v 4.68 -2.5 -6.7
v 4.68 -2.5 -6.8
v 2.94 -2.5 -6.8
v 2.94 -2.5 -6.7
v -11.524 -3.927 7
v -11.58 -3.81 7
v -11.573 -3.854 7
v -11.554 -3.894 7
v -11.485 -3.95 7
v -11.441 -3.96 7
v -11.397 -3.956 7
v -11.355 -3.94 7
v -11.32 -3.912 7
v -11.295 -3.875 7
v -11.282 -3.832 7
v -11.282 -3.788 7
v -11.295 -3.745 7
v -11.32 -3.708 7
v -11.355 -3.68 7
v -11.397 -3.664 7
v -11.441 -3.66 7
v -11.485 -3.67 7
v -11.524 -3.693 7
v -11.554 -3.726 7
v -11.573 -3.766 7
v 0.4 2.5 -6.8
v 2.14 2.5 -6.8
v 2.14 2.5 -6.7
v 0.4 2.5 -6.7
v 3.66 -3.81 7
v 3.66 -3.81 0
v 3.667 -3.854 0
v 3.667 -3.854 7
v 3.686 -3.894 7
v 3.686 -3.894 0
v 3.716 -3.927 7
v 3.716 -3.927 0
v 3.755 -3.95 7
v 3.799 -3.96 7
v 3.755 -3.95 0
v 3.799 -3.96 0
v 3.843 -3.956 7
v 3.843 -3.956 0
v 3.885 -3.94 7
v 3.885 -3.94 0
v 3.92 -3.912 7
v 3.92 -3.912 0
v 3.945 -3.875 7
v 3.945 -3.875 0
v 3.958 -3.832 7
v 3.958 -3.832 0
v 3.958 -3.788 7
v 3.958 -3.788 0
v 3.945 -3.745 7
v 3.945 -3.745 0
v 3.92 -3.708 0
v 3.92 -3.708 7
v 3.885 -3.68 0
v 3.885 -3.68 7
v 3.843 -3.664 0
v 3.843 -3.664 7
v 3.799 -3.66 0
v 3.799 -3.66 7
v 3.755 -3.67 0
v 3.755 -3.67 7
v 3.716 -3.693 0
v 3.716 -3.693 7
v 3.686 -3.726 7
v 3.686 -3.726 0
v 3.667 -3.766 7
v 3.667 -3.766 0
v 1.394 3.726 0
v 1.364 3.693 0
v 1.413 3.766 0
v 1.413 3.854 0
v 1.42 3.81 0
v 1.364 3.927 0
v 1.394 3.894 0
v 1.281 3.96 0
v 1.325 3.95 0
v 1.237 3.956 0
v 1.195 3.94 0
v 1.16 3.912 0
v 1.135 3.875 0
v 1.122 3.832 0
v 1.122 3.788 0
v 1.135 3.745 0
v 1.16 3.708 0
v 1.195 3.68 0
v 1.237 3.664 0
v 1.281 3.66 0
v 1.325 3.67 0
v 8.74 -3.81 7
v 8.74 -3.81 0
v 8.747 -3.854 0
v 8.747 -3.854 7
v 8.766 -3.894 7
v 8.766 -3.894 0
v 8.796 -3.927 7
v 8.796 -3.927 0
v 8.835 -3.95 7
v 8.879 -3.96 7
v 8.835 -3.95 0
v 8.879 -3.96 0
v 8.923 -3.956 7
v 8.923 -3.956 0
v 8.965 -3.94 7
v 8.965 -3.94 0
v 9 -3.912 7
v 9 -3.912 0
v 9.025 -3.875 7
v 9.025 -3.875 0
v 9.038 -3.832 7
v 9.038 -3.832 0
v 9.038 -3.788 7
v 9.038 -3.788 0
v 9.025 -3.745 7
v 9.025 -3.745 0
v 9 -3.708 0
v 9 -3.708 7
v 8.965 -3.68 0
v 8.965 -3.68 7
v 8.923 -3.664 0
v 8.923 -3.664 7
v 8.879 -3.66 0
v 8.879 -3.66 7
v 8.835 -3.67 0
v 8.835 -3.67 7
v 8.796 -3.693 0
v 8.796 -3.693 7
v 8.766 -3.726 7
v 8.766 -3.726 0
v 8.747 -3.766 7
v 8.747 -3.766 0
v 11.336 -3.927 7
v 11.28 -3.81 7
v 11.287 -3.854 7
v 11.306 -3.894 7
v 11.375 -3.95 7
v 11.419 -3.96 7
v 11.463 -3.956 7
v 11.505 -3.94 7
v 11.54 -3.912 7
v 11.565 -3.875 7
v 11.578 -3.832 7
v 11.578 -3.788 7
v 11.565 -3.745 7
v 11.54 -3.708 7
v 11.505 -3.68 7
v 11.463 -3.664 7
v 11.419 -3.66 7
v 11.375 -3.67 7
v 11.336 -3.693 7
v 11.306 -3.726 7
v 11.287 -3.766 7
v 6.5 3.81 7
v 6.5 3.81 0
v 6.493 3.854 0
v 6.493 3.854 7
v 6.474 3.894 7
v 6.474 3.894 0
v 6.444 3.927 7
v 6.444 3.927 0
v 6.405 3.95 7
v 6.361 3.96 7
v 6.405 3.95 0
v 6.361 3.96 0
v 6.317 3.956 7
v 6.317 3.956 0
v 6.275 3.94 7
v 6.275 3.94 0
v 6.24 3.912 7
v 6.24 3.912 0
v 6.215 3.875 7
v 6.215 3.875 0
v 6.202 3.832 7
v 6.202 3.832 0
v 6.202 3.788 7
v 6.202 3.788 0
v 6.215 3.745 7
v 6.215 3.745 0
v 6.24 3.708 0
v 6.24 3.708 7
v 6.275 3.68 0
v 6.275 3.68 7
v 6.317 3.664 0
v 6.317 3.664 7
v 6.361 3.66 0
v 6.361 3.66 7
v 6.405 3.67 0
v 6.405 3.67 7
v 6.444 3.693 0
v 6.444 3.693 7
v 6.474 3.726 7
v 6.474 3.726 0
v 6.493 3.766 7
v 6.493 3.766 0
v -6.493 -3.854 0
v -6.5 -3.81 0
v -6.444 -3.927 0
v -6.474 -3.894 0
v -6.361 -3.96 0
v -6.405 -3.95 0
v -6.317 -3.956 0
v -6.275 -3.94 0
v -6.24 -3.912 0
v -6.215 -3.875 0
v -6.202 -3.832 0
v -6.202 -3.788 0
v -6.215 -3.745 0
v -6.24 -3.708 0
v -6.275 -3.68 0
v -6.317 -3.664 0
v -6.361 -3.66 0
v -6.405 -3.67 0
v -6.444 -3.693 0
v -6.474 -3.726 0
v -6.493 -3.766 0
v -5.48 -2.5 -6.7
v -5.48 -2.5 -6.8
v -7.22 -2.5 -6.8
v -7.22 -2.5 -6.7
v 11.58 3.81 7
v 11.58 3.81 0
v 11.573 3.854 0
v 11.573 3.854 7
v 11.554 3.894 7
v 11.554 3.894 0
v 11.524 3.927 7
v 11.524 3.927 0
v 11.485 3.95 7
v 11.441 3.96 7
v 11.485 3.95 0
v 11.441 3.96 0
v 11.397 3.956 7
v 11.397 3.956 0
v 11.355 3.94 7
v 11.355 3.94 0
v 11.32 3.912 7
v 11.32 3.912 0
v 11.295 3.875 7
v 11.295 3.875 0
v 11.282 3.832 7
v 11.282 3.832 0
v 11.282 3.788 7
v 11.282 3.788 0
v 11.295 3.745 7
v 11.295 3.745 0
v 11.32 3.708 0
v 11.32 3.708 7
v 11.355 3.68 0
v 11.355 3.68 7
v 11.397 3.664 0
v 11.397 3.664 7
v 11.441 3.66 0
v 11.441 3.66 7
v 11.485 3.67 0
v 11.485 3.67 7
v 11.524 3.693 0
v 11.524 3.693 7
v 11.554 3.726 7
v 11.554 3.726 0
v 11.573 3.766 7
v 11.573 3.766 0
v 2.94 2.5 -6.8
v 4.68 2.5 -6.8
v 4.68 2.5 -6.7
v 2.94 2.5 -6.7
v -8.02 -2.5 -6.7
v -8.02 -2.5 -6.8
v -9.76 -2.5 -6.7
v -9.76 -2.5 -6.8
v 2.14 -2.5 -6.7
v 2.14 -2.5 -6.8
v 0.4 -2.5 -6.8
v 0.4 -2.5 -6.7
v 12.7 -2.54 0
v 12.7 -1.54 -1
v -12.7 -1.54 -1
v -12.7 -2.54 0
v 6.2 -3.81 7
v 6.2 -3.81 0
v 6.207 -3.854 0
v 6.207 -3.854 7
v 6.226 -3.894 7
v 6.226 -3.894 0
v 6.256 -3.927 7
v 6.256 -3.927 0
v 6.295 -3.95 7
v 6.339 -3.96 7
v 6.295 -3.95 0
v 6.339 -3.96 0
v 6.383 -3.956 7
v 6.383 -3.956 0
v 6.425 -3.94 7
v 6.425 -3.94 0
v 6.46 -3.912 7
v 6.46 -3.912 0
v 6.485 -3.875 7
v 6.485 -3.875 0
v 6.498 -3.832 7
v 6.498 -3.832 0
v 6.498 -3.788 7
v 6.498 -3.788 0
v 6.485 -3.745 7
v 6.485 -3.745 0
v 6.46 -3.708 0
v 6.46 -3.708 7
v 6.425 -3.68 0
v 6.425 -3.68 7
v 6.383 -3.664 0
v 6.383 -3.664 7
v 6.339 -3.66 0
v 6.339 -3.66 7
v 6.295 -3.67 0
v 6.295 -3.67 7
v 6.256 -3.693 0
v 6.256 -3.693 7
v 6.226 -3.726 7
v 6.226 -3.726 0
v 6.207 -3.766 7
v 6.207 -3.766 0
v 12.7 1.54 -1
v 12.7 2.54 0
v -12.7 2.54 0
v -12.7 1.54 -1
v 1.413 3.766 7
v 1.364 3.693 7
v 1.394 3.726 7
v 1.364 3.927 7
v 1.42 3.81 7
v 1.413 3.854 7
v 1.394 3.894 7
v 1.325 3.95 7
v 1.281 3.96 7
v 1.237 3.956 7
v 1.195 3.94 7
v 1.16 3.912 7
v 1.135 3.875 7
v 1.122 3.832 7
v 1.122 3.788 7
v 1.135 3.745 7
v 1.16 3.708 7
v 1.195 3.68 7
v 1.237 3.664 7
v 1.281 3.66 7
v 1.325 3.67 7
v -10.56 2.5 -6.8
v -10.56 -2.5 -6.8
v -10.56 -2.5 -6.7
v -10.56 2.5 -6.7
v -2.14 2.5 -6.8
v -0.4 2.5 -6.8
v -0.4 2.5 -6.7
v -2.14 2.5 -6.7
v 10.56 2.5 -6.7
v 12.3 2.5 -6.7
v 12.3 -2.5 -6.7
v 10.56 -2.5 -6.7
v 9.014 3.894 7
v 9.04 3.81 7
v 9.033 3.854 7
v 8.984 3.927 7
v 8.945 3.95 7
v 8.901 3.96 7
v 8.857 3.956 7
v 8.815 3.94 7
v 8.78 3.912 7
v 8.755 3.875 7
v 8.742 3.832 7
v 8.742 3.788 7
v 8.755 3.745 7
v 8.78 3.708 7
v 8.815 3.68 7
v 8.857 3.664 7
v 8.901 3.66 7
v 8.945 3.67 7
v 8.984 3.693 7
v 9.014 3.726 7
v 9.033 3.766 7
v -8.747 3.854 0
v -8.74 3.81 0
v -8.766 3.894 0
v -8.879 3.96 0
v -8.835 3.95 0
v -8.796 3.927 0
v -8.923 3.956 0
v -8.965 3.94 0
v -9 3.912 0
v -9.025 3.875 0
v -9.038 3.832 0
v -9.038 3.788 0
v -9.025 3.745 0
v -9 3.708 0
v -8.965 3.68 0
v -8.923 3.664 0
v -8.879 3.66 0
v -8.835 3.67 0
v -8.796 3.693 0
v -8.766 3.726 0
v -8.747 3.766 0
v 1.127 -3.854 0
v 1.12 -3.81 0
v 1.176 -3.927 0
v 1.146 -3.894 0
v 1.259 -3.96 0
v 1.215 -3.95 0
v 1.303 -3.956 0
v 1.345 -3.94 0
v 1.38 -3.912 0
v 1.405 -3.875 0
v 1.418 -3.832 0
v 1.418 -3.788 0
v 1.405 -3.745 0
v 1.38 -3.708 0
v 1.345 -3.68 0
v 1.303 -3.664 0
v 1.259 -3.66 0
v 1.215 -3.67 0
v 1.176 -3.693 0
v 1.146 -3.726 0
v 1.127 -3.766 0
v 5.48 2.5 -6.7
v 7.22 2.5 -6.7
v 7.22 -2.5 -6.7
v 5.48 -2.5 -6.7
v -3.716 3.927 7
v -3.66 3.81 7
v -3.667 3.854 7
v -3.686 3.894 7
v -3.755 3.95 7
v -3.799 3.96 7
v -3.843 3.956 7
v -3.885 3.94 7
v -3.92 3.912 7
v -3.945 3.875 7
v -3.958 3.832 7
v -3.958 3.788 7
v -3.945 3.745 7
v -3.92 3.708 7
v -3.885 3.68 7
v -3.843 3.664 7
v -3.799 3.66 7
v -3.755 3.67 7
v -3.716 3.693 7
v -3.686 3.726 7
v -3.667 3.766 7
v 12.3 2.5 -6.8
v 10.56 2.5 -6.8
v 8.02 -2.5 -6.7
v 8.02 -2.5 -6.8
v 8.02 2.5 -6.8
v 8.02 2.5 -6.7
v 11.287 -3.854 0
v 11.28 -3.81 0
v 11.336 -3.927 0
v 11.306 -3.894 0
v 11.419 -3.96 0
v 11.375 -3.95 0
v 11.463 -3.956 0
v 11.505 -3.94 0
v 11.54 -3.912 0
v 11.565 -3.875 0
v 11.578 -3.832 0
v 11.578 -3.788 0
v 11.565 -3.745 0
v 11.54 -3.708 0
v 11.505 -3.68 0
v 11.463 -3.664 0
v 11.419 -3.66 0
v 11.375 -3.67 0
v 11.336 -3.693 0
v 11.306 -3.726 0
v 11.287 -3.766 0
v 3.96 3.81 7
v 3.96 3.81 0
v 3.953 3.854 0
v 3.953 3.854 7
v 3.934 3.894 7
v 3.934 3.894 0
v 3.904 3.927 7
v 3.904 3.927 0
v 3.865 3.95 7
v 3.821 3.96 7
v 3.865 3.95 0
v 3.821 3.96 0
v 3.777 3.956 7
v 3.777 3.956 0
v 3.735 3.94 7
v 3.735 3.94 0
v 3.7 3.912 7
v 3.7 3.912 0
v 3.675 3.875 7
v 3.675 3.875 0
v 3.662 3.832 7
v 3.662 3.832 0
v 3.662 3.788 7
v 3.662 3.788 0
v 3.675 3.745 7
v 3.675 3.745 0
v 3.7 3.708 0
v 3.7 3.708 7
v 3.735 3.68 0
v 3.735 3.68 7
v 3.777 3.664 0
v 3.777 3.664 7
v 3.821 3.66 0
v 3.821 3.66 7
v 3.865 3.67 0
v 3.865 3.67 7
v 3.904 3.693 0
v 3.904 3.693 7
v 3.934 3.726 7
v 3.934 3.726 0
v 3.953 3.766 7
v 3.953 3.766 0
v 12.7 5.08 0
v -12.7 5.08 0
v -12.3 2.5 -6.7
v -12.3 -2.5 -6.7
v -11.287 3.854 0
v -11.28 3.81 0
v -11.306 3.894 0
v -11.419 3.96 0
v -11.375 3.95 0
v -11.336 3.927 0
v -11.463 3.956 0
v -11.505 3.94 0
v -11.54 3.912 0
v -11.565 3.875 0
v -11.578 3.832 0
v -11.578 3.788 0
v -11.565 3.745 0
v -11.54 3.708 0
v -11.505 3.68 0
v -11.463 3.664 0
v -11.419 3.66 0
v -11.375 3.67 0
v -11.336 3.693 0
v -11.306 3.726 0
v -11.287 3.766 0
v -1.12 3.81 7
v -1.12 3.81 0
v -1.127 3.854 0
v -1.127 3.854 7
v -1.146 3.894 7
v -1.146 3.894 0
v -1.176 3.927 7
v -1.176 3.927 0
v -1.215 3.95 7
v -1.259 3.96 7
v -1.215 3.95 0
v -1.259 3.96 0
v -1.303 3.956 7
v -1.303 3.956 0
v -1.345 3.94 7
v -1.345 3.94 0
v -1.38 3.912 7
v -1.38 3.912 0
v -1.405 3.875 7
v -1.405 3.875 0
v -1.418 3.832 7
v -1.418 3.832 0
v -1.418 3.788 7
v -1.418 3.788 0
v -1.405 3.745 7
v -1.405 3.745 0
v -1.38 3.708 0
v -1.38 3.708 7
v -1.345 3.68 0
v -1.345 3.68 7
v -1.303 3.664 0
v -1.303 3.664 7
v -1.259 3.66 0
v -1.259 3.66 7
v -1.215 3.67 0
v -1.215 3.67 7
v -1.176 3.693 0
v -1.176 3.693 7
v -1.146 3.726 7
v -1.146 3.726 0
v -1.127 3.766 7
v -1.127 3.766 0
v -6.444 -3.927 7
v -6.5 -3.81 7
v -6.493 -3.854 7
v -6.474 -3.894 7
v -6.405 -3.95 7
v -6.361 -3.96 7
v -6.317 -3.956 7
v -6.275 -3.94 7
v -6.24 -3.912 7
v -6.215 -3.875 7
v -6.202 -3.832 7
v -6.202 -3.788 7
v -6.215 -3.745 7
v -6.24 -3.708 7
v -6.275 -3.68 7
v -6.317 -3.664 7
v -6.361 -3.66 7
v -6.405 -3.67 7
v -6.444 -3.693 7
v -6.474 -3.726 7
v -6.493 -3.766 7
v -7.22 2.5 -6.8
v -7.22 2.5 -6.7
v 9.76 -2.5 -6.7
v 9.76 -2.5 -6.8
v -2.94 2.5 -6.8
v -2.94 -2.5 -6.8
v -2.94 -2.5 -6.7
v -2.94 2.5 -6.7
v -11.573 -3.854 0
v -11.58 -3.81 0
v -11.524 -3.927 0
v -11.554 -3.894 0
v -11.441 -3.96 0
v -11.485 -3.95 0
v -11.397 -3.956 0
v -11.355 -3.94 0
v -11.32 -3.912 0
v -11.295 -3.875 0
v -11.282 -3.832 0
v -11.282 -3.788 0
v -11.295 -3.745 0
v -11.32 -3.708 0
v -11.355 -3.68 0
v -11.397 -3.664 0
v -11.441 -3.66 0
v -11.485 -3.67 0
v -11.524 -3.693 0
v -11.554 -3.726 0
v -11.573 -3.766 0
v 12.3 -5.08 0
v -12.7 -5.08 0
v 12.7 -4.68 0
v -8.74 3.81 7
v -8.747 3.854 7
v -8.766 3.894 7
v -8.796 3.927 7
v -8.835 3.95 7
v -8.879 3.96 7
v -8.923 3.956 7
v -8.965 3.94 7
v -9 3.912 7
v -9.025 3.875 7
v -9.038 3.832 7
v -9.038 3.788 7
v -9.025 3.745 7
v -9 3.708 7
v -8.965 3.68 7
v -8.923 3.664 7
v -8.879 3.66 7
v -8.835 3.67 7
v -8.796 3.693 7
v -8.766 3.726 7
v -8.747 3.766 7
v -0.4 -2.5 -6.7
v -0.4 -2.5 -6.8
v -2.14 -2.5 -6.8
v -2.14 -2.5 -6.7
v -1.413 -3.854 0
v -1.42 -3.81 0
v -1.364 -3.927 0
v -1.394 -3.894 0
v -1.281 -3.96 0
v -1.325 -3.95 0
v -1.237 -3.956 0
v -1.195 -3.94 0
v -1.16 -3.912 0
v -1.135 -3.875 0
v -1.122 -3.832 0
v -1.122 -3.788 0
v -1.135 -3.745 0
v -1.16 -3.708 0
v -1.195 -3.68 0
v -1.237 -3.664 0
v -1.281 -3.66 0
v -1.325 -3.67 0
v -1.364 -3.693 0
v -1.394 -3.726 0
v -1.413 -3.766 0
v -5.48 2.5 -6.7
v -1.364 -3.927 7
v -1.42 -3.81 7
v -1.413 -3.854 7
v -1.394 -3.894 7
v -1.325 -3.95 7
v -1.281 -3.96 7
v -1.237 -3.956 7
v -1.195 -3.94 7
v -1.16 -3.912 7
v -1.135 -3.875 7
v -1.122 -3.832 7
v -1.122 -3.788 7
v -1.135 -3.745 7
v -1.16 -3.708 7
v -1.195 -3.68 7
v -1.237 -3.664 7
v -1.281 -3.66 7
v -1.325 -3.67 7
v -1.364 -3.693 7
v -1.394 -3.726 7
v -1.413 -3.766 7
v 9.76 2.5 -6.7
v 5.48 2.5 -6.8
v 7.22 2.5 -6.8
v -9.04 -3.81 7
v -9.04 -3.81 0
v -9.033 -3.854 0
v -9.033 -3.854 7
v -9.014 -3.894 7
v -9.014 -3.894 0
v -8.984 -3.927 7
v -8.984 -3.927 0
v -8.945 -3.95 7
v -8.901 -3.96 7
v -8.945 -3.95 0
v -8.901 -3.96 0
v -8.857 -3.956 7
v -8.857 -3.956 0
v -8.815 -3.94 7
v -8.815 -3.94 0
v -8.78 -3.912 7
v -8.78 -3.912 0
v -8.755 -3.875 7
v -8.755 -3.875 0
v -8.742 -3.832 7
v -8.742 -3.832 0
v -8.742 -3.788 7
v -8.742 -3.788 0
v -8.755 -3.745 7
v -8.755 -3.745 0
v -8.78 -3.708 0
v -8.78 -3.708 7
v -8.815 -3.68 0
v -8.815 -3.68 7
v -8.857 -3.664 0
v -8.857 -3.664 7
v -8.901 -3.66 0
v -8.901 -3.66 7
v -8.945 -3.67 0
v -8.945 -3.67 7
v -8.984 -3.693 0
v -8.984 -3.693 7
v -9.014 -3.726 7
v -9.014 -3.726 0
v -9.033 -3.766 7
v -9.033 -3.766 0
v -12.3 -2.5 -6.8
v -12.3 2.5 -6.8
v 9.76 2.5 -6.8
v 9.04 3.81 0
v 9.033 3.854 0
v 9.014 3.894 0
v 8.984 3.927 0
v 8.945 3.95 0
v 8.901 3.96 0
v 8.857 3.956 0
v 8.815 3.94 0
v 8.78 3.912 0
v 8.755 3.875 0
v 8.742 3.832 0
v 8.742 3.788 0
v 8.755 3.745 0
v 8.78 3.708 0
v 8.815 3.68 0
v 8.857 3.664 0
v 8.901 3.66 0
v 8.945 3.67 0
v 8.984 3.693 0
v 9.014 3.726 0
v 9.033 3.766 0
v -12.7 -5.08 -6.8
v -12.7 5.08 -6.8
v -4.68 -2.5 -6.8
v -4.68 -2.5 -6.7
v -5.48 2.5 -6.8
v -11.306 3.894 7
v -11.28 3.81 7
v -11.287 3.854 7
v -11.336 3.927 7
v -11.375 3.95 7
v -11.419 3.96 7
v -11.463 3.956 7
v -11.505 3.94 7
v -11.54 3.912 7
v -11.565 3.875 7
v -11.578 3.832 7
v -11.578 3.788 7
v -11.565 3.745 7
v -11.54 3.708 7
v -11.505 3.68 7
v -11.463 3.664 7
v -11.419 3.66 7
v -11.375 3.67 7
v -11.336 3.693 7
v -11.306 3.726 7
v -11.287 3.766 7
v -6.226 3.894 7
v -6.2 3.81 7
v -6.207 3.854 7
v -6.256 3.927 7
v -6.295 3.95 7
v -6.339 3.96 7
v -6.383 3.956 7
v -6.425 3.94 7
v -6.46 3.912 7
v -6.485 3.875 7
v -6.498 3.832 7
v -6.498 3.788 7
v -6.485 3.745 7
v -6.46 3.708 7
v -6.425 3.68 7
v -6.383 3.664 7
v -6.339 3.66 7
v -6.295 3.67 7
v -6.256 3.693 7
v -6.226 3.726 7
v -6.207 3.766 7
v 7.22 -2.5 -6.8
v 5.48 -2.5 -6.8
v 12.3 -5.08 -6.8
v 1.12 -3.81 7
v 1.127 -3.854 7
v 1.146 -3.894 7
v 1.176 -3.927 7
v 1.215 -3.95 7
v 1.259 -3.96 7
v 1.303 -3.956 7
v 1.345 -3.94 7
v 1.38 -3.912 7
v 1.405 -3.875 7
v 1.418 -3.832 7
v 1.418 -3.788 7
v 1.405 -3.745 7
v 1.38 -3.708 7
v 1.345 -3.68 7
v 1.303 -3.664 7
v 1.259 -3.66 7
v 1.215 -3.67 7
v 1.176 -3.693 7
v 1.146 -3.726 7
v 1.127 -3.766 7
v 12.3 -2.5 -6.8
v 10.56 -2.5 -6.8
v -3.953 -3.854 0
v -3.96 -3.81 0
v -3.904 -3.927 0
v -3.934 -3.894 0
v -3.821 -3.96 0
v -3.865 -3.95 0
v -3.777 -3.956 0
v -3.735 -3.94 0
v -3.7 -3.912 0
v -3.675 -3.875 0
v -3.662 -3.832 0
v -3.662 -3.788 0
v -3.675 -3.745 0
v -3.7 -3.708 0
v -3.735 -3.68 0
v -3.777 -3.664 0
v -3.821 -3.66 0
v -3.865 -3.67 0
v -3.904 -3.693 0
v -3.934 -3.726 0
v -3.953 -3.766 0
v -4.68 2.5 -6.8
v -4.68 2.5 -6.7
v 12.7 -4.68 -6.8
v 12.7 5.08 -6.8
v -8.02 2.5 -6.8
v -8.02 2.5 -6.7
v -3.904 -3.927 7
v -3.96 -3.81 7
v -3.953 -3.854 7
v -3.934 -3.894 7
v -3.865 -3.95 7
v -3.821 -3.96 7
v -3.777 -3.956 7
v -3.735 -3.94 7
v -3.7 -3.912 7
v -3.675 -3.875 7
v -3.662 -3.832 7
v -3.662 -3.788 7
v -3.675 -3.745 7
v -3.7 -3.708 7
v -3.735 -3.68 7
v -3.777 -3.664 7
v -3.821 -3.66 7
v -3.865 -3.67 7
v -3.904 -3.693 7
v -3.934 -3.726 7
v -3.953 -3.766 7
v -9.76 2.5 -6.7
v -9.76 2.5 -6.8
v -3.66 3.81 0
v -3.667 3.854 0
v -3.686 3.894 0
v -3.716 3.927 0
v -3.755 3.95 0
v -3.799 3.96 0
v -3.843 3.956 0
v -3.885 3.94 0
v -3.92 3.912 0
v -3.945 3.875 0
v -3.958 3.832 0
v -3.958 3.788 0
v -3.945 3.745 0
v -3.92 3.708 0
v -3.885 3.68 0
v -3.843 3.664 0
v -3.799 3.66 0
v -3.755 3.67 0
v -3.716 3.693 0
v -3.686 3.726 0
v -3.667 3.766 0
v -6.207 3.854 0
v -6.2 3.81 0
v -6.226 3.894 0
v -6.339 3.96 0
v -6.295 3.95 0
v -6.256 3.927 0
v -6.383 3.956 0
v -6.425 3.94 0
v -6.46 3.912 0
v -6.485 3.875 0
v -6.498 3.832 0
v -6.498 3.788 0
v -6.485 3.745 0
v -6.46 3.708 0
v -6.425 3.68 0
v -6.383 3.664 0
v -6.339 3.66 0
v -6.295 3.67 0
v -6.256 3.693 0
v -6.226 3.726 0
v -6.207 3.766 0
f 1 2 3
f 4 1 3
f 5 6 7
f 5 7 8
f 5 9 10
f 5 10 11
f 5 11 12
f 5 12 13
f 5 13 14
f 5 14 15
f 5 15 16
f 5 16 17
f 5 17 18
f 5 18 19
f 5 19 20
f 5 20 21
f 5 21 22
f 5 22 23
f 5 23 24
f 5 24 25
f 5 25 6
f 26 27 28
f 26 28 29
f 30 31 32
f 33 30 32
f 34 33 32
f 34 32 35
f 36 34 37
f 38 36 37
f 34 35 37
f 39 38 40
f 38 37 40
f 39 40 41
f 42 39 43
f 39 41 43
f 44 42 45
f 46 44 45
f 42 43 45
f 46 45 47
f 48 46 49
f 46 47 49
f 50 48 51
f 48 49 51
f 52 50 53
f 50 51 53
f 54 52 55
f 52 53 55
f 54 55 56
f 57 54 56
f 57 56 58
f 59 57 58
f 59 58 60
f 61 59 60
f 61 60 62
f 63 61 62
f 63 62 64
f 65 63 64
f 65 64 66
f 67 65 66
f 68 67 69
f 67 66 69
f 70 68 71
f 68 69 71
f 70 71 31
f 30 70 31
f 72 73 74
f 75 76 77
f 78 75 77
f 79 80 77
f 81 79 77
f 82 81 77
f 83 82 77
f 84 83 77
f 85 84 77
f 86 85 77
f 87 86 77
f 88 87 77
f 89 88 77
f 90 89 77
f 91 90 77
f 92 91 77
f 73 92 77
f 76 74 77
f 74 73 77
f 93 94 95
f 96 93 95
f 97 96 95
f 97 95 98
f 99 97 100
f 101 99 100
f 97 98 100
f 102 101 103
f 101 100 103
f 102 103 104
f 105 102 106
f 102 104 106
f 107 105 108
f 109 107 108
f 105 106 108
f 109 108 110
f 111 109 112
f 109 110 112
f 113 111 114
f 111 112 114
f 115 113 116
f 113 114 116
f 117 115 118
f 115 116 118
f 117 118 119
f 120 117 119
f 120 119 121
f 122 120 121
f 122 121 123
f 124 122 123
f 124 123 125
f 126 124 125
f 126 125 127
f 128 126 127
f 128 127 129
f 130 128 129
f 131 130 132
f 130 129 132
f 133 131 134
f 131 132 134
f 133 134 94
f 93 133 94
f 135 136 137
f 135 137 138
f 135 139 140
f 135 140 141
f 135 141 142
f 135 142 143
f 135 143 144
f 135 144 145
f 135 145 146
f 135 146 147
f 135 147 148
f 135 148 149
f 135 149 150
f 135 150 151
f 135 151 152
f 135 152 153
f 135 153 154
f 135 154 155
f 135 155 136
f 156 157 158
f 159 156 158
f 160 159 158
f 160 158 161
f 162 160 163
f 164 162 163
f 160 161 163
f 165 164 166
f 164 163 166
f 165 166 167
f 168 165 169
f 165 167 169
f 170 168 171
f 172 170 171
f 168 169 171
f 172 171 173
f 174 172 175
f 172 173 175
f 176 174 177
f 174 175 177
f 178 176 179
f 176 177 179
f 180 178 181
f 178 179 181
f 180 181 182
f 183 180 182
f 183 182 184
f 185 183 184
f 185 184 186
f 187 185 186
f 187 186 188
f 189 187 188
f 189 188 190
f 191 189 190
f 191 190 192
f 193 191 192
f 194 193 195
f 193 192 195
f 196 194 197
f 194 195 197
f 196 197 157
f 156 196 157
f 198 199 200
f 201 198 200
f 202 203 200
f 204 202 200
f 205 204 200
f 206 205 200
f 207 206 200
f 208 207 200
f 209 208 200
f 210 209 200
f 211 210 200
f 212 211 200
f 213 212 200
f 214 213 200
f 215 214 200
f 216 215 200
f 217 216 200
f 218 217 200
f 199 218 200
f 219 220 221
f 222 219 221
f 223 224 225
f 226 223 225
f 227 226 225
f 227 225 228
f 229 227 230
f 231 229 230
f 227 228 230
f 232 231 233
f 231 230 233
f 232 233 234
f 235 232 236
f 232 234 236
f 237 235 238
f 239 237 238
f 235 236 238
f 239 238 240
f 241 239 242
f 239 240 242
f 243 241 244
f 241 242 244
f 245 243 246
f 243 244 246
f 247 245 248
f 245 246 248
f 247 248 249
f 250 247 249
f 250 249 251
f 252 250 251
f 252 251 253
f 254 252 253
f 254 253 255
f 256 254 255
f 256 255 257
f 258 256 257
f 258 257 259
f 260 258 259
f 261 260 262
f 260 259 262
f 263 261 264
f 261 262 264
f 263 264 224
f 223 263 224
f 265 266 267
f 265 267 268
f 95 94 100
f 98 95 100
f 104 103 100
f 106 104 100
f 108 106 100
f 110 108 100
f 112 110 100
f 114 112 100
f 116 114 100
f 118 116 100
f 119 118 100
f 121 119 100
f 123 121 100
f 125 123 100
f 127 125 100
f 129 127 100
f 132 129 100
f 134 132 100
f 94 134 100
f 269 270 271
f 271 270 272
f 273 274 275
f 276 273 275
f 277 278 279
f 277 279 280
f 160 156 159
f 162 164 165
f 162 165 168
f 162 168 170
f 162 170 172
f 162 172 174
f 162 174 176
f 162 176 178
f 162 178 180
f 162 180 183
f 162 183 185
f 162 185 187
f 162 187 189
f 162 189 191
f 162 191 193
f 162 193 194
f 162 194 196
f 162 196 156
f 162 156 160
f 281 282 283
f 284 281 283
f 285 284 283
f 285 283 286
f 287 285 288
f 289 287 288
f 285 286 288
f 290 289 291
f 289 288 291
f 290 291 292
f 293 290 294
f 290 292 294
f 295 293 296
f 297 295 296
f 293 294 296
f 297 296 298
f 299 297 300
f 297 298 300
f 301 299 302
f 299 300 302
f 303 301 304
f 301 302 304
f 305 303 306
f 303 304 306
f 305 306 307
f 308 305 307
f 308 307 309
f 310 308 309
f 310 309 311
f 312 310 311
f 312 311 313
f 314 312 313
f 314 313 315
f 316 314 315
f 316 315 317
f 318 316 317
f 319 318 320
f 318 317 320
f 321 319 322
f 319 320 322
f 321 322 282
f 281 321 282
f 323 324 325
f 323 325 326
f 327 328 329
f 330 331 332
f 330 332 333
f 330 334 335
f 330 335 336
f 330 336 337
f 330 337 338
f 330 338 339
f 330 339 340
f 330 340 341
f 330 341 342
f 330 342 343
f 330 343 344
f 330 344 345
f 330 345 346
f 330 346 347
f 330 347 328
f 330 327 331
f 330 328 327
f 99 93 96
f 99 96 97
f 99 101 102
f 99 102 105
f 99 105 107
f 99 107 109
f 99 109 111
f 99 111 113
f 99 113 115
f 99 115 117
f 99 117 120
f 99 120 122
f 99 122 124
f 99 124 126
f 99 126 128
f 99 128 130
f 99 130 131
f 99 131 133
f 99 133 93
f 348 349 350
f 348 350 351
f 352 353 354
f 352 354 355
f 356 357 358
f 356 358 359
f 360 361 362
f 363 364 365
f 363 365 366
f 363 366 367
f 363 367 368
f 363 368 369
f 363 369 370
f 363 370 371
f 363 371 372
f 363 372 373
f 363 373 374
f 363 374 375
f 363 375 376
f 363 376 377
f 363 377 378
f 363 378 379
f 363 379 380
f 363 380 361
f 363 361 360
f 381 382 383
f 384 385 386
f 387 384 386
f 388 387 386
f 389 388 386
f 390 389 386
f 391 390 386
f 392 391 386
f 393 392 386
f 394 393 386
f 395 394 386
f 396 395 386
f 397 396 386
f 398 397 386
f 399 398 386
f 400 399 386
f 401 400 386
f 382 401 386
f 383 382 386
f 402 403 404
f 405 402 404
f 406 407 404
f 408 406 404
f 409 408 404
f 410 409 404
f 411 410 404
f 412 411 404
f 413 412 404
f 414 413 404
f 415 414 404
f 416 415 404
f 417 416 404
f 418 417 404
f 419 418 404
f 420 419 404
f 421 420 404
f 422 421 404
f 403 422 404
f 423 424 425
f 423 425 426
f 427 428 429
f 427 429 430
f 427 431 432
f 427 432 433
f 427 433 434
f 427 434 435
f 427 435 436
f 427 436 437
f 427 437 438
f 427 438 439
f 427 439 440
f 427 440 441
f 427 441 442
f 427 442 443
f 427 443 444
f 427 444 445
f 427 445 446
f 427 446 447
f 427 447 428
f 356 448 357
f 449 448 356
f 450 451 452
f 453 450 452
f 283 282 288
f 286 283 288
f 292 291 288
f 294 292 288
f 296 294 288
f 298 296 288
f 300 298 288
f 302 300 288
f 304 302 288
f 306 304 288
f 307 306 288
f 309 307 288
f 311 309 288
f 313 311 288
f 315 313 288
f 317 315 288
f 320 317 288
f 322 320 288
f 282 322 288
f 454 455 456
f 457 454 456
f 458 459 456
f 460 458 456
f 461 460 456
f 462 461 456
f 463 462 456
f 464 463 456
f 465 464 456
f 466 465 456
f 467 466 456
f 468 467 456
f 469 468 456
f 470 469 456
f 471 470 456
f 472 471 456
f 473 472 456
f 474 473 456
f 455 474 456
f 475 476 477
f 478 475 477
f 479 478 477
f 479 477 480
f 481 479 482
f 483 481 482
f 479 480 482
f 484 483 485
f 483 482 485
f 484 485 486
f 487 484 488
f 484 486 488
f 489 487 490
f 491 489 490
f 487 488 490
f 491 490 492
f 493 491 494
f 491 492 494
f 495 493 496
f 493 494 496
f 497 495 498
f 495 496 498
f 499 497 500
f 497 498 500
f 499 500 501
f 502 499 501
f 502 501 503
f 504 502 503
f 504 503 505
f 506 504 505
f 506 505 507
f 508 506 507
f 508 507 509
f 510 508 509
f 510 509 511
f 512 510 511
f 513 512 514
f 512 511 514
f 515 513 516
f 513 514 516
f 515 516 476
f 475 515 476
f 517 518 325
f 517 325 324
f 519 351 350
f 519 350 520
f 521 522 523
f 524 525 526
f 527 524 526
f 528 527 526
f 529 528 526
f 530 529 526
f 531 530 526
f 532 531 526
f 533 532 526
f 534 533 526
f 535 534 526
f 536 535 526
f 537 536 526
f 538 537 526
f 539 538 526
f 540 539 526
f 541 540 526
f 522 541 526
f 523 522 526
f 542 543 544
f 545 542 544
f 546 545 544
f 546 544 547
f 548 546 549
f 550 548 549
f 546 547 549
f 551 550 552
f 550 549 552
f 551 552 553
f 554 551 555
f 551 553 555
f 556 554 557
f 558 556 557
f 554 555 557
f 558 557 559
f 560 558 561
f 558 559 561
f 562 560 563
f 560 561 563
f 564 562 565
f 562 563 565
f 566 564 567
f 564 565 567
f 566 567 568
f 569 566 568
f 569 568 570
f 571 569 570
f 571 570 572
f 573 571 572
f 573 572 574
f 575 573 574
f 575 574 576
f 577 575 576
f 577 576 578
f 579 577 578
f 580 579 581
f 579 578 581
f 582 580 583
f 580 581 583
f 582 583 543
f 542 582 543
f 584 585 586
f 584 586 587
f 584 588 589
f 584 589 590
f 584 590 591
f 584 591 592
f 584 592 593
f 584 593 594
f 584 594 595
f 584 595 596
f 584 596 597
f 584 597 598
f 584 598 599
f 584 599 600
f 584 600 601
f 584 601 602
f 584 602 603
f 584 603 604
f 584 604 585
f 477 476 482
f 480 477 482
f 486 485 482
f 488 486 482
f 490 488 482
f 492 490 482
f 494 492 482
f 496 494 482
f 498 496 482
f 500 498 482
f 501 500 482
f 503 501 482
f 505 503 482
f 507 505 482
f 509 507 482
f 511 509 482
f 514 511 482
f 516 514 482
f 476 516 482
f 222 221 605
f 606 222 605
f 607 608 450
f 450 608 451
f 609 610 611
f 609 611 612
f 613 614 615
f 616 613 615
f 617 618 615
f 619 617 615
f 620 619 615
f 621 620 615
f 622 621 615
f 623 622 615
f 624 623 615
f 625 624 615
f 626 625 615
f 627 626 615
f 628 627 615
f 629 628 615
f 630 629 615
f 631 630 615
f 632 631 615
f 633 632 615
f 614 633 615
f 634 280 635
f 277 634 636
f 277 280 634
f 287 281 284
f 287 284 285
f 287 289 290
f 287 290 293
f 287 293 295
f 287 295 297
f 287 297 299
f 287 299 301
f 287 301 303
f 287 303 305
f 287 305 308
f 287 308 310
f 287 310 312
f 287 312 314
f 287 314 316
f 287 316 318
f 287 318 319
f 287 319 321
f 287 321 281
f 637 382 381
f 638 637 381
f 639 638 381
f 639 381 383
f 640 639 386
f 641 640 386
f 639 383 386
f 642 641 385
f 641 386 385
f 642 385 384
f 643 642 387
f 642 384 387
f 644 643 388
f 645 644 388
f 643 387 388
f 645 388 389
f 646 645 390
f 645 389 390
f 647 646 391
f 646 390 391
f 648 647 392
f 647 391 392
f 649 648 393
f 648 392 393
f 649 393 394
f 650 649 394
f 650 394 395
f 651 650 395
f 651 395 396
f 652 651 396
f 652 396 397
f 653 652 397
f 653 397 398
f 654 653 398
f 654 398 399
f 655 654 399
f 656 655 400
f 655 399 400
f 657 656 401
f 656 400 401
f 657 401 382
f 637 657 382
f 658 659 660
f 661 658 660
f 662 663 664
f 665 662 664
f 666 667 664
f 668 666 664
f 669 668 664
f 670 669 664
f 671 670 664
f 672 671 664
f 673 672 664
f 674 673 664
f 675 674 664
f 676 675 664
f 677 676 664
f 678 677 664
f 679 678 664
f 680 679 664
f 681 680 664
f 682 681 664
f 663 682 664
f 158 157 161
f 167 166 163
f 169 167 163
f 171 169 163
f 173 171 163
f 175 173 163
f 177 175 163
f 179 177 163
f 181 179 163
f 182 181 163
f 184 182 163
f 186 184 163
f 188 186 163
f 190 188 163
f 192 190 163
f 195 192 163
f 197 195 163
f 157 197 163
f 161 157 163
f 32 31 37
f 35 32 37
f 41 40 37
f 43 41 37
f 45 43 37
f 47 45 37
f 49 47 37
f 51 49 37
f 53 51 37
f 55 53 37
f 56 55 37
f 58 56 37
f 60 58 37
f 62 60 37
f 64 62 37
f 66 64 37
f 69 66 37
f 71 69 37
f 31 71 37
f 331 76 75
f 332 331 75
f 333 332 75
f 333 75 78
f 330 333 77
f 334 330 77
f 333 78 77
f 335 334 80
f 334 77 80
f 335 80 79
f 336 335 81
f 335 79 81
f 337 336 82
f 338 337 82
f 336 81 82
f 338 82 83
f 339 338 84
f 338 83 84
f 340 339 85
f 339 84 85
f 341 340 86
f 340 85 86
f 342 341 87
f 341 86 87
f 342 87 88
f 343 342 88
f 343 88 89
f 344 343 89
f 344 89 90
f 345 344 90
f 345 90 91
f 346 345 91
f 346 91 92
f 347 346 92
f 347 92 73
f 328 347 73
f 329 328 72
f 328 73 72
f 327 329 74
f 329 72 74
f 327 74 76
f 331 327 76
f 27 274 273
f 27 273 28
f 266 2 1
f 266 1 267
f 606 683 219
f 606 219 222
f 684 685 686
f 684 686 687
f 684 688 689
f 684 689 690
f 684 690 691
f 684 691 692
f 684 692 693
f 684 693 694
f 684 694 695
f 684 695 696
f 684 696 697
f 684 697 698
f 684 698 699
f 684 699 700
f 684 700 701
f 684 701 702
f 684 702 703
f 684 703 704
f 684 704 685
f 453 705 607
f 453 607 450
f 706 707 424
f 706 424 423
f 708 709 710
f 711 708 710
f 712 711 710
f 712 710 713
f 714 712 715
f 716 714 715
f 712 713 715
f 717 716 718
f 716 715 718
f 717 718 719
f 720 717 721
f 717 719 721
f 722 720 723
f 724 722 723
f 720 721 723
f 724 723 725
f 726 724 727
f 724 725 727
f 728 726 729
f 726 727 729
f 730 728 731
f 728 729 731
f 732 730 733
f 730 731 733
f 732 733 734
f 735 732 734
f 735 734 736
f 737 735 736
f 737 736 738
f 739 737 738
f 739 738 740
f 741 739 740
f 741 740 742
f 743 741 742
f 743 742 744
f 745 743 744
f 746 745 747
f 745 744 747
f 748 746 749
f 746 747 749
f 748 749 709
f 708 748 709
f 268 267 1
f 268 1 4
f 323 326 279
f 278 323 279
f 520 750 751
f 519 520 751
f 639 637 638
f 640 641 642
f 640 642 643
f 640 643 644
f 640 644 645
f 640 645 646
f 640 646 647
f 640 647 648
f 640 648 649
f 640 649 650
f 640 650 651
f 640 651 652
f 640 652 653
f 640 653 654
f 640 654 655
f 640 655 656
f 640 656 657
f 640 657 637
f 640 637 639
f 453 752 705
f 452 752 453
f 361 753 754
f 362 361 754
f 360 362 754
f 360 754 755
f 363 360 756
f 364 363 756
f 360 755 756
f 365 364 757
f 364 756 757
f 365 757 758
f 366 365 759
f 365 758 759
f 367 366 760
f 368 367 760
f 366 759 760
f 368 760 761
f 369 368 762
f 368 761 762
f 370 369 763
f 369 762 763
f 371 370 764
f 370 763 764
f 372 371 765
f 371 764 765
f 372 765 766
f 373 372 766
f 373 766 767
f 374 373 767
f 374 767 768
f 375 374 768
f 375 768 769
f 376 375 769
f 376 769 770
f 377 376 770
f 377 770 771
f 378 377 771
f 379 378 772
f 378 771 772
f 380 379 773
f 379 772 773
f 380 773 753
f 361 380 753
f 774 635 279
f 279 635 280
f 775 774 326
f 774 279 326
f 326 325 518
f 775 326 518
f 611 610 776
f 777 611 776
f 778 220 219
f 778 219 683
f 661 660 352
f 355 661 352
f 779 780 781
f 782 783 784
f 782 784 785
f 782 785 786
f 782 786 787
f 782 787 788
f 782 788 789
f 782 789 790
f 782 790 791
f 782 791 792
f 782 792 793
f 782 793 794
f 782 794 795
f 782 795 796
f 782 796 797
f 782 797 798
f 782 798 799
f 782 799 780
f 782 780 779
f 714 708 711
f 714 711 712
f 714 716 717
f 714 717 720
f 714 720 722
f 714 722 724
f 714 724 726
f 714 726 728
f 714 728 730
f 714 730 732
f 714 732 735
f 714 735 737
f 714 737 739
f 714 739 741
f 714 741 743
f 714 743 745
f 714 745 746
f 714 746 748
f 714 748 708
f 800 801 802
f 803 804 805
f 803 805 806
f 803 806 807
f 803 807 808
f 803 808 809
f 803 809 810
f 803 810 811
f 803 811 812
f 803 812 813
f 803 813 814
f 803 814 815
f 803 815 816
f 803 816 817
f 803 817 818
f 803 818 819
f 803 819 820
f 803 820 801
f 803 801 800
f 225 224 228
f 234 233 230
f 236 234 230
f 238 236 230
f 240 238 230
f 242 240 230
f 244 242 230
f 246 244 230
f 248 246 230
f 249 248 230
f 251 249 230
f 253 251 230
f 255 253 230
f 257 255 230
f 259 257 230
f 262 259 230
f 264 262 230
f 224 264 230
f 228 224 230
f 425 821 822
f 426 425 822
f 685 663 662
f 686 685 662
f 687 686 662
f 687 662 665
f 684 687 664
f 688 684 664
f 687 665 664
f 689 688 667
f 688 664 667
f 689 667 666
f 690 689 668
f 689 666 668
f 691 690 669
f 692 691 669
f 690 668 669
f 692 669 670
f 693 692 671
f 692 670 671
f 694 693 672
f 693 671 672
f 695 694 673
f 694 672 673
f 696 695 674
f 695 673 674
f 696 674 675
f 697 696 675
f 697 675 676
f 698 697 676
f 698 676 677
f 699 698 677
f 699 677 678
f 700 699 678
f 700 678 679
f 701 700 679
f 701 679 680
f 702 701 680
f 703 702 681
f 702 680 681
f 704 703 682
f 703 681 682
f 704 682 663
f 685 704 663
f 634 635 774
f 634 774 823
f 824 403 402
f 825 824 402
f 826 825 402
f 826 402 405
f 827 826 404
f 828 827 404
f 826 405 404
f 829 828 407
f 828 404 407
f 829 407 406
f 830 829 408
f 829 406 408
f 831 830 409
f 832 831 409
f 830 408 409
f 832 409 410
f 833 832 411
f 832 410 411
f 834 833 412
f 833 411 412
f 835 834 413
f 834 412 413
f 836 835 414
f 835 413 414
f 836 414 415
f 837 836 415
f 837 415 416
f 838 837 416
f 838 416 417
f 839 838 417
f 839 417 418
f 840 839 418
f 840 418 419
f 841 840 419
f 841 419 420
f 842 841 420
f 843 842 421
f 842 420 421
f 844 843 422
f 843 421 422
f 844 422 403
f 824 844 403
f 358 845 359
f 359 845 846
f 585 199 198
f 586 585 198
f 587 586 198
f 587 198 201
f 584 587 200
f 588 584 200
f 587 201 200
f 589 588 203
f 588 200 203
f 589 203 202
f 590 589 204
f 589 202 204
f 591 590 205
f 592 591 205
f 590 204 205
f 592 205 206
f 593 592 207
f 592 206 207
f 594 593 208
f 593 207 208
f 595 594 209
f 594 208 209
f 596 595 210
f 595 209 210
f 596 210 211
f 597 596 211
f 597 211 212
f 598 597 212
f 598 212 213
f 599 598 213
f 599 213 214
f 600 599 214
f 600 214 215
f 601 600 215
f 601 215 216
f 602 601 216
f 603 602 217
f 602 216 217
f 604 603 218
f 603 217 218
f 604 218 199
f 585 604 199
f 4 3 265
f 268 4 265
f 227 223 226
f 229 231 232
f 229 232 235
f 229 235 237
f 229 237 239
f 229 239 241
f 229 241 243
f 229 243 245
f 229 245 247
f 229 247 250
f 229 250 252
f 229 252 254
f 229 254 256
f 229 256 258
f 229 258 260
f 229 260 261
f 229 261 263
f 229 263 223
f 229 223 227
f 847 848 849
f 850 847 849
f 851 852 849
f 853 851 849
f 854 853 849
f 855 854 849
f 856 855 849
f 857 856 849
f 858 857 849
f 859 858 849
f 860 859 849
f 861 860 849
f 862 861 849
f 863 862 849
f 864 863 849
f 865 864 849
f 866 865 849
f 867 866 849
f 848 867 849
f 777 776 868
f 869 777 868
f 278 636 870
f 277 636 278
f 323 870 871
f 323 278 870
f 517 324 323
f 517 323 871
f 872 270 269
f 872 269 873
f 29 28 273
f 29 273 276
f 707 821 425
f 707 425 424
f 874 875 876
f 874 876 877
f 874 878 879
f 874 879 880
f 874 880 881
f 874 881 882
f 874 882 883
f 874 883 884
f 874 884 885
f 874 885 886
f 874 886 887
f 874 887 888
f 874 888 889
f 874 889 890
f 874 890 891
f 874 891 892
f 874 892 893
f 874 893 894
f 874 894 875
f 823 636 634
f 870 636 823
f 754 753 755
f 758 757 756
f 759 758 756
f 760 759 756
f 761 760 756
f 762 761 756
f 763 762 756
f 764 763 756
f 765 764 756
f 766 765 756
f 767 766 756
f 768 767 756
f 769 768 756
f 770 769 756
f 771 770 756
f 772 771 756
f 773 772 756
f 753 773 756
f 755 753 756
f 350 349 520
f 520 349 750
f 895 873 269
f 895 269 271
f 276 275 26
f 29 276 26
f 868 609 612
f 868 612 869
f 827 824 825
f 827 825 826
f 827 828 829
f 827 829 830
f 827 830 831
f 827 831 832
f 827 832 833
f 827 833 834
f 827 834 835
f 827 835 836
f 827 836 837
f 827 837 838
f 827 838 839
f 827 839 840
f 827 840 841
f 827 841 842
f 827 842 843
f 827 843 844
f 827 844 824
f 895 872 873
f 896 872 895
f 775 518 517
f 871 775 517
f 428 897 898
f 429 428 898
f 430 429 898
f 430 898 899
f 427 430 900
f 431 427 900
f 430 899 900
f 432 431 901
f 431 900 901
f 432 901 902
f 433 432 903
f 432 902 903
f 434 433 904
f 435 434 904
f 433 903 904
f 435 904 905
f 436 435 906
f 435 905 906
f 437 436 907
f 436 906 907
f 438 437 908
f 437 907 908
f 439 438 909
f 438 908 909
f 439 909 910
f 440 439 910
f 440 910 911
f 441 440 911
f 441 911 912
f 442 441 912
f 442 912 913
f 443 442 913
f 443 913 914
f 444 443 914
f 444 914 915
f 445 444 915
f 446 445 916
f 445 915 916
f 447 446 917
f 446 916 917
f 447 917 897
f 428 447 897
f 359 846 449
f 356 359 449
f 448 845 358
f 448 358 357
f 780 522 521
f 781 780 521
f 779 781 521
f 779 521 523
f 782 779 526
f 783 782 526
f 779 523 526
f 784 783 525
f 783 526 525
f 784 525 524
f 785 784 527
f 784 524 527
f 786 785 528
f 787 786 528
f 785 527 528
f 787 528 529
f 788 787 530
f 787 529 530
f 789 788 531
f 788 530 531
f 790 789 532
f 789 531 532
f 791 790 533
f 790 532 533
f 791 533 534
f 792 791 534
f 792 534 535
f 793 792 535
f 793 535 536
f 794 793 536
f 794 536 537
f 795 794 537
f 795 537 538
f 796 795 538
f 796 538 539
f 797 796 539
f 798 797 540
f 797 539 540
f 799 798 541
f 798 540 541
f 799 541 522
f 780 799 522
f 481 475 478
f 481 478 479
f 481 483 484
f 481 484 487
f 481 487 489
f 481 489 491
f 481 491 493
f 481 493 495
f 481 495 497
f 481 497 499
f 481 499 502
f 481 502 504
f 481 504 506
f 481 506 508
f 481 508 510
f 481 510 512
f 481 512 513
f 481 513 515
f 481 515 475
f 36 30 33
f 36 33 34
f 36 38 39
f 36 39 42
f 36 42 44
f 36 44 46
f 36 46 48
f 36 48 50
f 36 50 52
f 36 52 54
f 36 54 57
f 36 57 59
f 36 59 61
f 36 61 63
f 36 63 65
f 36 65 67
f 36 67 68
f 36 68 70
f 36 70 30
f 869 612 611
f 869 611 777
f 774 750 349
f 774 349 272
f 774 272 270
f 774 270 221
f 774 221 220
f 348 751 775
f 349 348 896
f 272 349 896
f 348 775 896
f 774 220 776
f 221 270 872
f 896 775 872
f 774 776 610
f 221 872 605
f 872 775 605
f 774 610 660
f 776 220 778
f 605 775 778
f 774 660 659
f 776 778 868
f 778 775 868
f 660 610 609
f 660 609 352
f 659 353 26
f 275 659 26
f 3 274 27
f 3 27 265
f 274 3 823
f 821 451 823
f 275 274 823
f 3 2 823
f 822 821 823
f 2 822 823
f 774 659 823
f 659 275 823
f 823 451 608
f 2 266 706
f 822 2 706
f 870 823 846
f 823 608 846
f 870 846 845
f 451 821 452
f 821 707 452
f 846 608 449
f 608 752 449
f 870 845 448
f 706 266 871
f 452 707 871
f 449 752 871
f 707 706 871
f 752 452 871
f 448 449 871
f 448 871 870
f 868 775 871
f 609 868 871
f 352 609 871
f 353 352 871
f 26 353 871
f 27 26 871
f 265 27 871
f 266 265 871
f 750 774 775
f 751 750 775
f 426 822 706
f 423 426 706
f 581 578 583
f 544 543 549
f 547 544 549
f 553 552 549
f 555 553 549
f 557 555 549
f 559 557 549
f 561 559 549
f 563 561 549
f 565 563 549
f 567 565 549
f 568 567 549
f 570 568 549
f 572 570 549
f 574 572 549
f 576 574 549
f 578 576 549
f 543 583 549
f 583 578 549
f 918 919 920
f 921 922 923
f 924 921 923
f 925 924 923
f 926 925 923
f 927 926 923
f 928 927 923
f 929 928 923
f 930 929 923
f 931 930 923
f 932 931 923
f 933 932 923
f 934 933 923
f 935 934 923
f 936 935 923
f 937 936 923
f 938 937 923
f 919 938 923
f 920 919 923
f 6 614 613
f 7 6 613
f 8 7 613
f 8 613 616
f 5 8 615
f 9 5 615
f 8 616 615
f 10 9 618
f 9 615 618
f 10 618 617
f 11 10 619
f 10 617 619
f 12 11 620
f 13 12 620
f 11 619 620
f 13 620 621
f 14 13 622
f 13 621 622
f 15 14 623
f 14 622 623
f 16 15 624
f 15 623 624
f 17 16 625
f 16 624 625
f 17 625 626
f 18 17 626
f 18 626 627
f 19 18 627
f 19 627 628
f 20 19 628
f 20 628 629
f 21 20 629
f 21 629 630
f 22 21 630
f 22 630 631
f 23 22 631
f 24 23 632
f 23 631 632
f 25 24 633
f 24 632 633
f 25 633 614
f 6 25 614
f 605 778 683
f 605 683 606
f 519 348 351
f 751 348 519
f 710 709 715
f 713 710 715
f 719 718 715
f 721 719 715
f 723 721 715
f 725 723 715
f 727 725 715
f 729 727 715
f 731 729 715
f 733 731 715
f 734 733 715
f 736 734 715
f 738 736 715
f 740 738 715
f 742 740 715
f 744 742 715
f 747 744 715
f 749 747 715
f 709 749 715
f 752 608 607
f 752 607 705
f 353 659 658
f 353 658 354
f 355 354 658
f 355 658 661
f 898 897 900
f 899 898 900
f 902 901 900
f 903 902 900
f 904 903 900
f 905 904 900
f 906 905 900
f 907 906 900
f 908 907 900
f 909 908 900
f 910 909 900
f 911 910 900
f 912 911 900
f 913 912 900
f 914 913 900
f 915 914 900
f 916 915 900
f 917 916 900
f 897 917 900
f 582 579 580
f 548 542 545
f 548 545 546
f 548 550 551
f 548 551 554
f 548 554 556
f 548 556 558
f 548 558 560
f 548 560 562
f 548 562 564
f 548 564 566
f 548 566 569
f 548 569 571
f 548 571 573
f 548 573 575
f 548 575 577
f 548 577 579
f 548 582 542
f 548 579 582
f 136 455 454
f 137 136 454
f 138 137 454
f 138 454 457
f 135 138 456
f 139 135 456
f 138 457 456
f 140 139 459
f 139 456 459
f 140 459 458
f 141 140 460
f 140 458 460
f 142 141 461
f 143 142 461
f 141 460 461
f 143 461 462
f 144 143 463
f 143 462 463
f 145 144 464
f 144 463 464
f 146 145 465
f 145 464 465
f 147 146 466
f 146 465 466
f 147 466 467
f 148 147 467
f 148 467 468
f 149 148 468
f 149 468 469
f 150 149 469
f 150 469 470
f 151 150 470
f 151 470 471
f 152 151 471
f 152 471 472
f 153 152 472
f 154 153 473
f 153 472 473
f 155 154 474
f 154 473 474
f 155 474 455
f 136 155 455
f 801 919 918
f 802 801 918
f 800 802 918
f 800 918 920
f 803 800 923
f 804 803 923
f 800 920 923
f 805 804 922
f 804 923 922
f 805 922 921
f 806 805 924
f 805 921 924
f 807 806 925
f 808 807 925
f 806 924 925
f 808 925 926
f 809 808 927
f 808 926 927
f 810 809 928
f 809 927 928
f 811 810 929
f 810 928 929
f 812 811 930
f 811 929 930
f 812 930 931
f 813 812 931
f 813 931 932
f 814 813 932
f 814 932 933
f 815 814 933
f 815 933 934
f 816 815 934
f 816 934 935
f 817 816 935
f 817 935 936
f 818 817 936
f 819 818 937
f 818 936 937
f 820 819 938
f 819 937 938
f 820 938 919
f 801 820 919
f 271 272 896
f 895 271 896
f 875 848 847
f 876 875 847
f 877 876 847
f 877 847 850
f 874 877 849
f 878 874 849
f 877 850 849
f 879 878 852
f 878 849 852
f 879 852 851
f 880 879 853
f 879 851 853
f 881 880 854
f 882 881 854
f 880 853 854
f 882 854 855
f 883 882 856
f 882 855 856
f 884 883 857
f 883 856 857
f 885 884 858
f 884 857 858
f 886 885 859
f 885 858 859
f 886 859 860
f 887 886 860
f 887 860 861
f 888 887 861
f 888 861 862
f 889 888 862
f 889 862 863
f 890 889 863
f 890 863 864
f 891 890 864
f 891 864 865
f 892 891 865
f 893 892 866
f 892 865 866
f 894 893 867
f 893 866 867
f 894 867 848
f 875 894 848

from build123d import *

# Parameters (mm, degrees)
SKETCH1_W              = 25.4
SKETCH1_H              = 10.16
BOSS_EXTRUDE1_DEPTH    = 6.8
CUT_EXTRUDE1_DEPTH     = 27.780709475
SKETCH3_R              = 0.15
BOSS_EXTRUDE2_DEPTH    = 7
BOSS_EXTRUDE2_2_DEPTH  = 7
BOSS_EXTRUDE2_3_DEPTH  = 7
BOSS_EXTRUDE2_4_DEPTH  = 7
BOSS_EXTRUDE2_5_DEPTH  = 7
BOSS_EXTRUDE2_6_DEPTH  = 7
BOSS_EXTRUDE2_7_DEPTH  = 7
BOSS_EXTRUDE2_8_DEPTH  = 7
BOSS_EXTRUDE2_9_DEPTH  = 7
BOSS_EXTRUDE2_10_DEPTH = 7
BOSS_EXTRUDE2_11_DEPTH = 7
BOSS_EXTRUDE2_12_DEPTH = 7
BOSS_EXTRUDE2_13_DEPTH = 7
BOSS_EXTRUDE2_14_DEPTH = 7
BOSS_EXTRUDE2_15_DEPTH = 7
BOSS_EXTRUDE2_16_DEPTH = 7
BOSS_EXTRUDE2_17_DEPTH = 7
BOSS_EXTRUDE2_18_DEPTH = 7
BOSS_EXTRUDE2_19_DEPTH = 7
BOSS_EXTRUDE2_20_DEPTH = 7
SKETCH4_W              = 1.74
SKETCH4_H              = 5
CUT_EXTRUDE2_DEPTH     = 0.1
CHAMFER1_SIZE          = 0.4


with BuildPart() as part:
    # Sketch1 → Boss-Extrude1 (new body)
    with BuildSketch(Plane.XY):
        Rectangle(SKETCH1_W, SKETCH1_H)
    extrude(amount=-BOSS_EXTRUDE1_DEPTH)

    # Sketch2 → Cut-Extrude1 (cut, through all)
    with BuildSketch(Plane.ZY.offset(12.7)):
        Polygon((0, -2.54), (0, 2.54), (-1, 1.54), (-1, -1.54), align=None)
    extrude(amount=-CUT_EXTRUDE1_DEPTH, mode=Mode.SUBTRACT)

    # Sketch4 → Cut-Extrude2 (cut)
    with BuildSketch(Plane(origin=(0, 0, -6.8), x_dir=(-1, 0, 0), z_dir=(0, 0, -1))):
        with Locations((11.43, 0)):
            Rectangle(SKETCH4_W, SKETCH4_H)
        with Locations((8.89, 0)):
            Rectangle(SKETCH4_W, SKETCH4_H)
        with Locations((6.35, 0)):
            Rectangle(SKETCH4_W, SKETCH4_H)
        with Locations((3.81, 0)):
            Rectangle(SKETCH4_W, SKETCH4_H)
        with Locations((1.27, 0)):
            Rectangle(SKETCH4_W, SKETCH4_H)
        with Locations((-1.27, 0)):
            Rectangle(SKETCH4_W, SKETCH4_H)
        with Locations((-3.81, 0)):
            Rectangle(SKETCH4_W, SKETCH4_H)
        with Locations((-6.35, 0)):
            Rectangle(SKETCH4_W, SKETCH4_H)
        with Locations((-8.89, 0)):
            Rectangle(SKETCH4_W, SKETCH4_H)
        with Locations((-11.43, 0)):
            Rectangle(SKETCH4_W, SKETCH4_H)
    extrude(amount=-CUT_EXTRUDE2_DEPTH, mode=Mode.SUBTRACT)

    # Chamfer1
    chamfer1_edges = [part.edges().sort_by_distance(p)[0] for p in [
        (12.7, -5.08, -3.4),
    ]]
    chamfer(chamfer1_edges, length=CHAMFER1_SIZE)


with BuildPart() as body_2:
    # Sketch3 → Boss-Extrude2 (new body)
    with BuildSketch(Plane.XY):
        with Locations((11.43, 3.81)):
            Circle(SKETCH3_R)
    extrude(amount=BOSS_EXTRUDE2_DEPTH)


with BuildPart() as body_3:
    # Sketch3 → Boss-Extrude2 2 (new body)
    with BuildSketch(Plane.XY):
        with Locations((8.89, 3.81)):
            Circle(SKETCH3_R)
    extrude(amount=BOSS_EXTRUDE2_2_DEPTH)


with BuildPart() as body_4:
    # Sketch3 → Boss-Extrude2 3 (new body)
    with BuildSketch(Plane.XY):
        with Locations((6.35, 3.81)):
            Circle(SKETCH3_R)
    extrude(amount=BOSS_EXTRUDE2_3_DEPTH)


with BuildPart() as body_5:
    # Sketch3 → Boss-Extrude2 4 (new body)
    with BuildSketch(Plane.XY):
        with Locations((3.81, 3.81)):
            Circle(SKETCH3_R)
    extrude(amount=BOSS_EXTRUDE2_4_DEPTH)


with BuildPart() as body_6:
    # Sketch3 → Boss-Extrude2 5 (new body)
    with BuildSketch(Plane.XY):
        with Locations((1.27, 3.81)):
            Circle(SKETCH3_R)
    extrude(amount=BOSS_EXTRUDE2_5_DEPTH)


with BuildPart() as body_7:
    # Sketch3 → Boss-Extrude2 6 (new body)
    with BuildSketch(Plane.XY):
        with Locations((-1.27, 3.81)):
            Circle(SKETCH3_R)
    extrude(amount=BOSS_EXTRUDE2_6_DEPTH)


with BuildPart() as body_8:
    # Sketch3 → Boss-Extrude2 7 (new body)
    with BuildSketch(Plane.XY):
        with Locations((-3.81, 3.81)):
            Circle(SKETCH3_R)
    extrude(amount=BOSS_EXTRUDE2_7_DEPTH)


with BuildPart() as body_9:
    # Sketch3 → Boss-Extrude2 8 (new body)
    with BuildSketch(Plane.XY):
        with Locations((-6.35, 3.81)):
            Circle(SKETCH3_R)
    extrude(amount=BOSS_EXTRUDE2_8_DEPTH)


with BuildPart() as body_10:
    # Sketch3 → Boss-Extrude2 9 (new body)
    with BuildSketch(Plane.XY):
        with Locations((-8.89, 3.81)):
            Circle(SKETCH3_R)
    extrude(amount=BOSS_EXTRUDE2_9_DEPTH)


with BuildPart() as body_11:
    # Sketch3 → Boss-Extrude2 10 (new body)
    with BuildSketch(Plane.XY):
        with Locations((-11.43, 3.81)):
            Circle(SKETCH3_R)
    extrude(amount=BOSS_EXTRUDE2_10_DEPTH)


with BuildPart() as body_12:
    # Sketch3 → Boss-Extrude2 11 (new body)
    with BuildSketch(Plane.XY):
        with Locations(Location((-11.43, -3.81, 0), (0, 0, 180))):
            Circle(SKETCH3_R)
    extrude(amount=BOSS_EXTRUDE2_11_DEPTH)


with BuildPart() as body_13:
    # Sketch3 → Boss-Extrude2 12 (new body)
    with BuildSketch(Plane.XY):
        with Locations(Location((-8.89, -3.81, 0), (0, 0, 180))):
            Circle(SKETCH3_R)
    extrude(amount=BOSS_EXTRUDE2_12_DEPTH)


with BuildPart() as body_14:
    # Sketch3 → Boss-Extrude2 13 (new body)
    with BuildSketch(Plane.XY):
        with Locations(Location((-6.35, -3.81, 0), (0, 0, 180))):
            Circle(SKETCH3_R)
    extrude(amount=BOSS_EXTRUDE2_13_DEPTH)


with BuildPart() as body_15:
    # Sketch3 → Boss-Extrude2 14 (new body)
    with BuildSketch(Plane.XY):
        with Locations(Location((-3.81, -3.81, 0), (0, 0, 180))):
            Circle(SKETCH3_R)
    extrude(amount=BOSS_EXTRUDE2_14_DEPTH)


with BuildPart() as body_16:
    # Sketch3 → Boss-Extrude2 15 (new body)
    with BuildSketch(Plane.XY):
        with Locations(Location((-1.27, -3.81, 0), (0, 0, 180))):
            Circle(SKETCH3_R)
    extrude(amount=BOSS_EXTRUDE2_15_DEPTH)


with BuildPart() as body_17:
    # Sketch3 → Boss-Extrude2 16 (new body)
    with BuildSketch(Plane.XY):
        with Locations(Location((1.27, -3.81, 0), (0, 0, 180))):
            Circle(SKETCH3_R)
    extrude(amount=BOSS_EXTRUDE2_16_DEPTH)


with BuildPart() as body_18:
    # Sketch3 → Boss-Extrude2 17 (new body)
    with BuildSketch(Plane.XY):
        with Locations(Location((3.81, -3.81, 0), (0, 0, 180))):
            Circle(SKETCH3_R)
    extrude(amount=BOSS_EXTRUDE2_17_DEPTH)


with BuildPart() as body_19:
    # Sketch3 → Boss-Extrude2 18 (new body)
    with BuildSketch(Plane.XY):
        with Locations(Location((6.35, -3.81, 0), (0, 0, 180))):
            Circle(SKETCH3_R)
    extrude(amount=BOSS_EXTRUDE2_18_DEPTH)


with BuildPart() as body_20:
    # Sketch3 → Boss-Extrude2 19 (new body)
    with BuildSketch(Plane.XY):
        with Locations(Location((8.89, -3.81, 0), (0, 0, 180))):
            Circle(SKETCH3_R)
    extrude(amount=BOSS_EXTRUDE2_19_DEPTH)


with BuildPart() as body_21:
    # Sketch3 → Boss-Extrude2 20 (new body)
    with BuildSketch(Plane.XY):
        with Locations(Location((11.43, -3.81, 0), (0, 0, 180))):
            Circle(SKETCH3_R)
    extrude(amount=BOSS_EXTRUDE2_20_DEPTH)


solid = Compound([part.part, body_2.part, body_3.part, body_4.part, body_5.part, body_6.part, body_7.part, body_8.part, body_9.part, body_10.part, body_11.part, body_12.part, body_13.part, body_14.part, body_15.part, body_16.part, body_17.part, body_18.part, body_19.part, body_20.part, body_21.part])
